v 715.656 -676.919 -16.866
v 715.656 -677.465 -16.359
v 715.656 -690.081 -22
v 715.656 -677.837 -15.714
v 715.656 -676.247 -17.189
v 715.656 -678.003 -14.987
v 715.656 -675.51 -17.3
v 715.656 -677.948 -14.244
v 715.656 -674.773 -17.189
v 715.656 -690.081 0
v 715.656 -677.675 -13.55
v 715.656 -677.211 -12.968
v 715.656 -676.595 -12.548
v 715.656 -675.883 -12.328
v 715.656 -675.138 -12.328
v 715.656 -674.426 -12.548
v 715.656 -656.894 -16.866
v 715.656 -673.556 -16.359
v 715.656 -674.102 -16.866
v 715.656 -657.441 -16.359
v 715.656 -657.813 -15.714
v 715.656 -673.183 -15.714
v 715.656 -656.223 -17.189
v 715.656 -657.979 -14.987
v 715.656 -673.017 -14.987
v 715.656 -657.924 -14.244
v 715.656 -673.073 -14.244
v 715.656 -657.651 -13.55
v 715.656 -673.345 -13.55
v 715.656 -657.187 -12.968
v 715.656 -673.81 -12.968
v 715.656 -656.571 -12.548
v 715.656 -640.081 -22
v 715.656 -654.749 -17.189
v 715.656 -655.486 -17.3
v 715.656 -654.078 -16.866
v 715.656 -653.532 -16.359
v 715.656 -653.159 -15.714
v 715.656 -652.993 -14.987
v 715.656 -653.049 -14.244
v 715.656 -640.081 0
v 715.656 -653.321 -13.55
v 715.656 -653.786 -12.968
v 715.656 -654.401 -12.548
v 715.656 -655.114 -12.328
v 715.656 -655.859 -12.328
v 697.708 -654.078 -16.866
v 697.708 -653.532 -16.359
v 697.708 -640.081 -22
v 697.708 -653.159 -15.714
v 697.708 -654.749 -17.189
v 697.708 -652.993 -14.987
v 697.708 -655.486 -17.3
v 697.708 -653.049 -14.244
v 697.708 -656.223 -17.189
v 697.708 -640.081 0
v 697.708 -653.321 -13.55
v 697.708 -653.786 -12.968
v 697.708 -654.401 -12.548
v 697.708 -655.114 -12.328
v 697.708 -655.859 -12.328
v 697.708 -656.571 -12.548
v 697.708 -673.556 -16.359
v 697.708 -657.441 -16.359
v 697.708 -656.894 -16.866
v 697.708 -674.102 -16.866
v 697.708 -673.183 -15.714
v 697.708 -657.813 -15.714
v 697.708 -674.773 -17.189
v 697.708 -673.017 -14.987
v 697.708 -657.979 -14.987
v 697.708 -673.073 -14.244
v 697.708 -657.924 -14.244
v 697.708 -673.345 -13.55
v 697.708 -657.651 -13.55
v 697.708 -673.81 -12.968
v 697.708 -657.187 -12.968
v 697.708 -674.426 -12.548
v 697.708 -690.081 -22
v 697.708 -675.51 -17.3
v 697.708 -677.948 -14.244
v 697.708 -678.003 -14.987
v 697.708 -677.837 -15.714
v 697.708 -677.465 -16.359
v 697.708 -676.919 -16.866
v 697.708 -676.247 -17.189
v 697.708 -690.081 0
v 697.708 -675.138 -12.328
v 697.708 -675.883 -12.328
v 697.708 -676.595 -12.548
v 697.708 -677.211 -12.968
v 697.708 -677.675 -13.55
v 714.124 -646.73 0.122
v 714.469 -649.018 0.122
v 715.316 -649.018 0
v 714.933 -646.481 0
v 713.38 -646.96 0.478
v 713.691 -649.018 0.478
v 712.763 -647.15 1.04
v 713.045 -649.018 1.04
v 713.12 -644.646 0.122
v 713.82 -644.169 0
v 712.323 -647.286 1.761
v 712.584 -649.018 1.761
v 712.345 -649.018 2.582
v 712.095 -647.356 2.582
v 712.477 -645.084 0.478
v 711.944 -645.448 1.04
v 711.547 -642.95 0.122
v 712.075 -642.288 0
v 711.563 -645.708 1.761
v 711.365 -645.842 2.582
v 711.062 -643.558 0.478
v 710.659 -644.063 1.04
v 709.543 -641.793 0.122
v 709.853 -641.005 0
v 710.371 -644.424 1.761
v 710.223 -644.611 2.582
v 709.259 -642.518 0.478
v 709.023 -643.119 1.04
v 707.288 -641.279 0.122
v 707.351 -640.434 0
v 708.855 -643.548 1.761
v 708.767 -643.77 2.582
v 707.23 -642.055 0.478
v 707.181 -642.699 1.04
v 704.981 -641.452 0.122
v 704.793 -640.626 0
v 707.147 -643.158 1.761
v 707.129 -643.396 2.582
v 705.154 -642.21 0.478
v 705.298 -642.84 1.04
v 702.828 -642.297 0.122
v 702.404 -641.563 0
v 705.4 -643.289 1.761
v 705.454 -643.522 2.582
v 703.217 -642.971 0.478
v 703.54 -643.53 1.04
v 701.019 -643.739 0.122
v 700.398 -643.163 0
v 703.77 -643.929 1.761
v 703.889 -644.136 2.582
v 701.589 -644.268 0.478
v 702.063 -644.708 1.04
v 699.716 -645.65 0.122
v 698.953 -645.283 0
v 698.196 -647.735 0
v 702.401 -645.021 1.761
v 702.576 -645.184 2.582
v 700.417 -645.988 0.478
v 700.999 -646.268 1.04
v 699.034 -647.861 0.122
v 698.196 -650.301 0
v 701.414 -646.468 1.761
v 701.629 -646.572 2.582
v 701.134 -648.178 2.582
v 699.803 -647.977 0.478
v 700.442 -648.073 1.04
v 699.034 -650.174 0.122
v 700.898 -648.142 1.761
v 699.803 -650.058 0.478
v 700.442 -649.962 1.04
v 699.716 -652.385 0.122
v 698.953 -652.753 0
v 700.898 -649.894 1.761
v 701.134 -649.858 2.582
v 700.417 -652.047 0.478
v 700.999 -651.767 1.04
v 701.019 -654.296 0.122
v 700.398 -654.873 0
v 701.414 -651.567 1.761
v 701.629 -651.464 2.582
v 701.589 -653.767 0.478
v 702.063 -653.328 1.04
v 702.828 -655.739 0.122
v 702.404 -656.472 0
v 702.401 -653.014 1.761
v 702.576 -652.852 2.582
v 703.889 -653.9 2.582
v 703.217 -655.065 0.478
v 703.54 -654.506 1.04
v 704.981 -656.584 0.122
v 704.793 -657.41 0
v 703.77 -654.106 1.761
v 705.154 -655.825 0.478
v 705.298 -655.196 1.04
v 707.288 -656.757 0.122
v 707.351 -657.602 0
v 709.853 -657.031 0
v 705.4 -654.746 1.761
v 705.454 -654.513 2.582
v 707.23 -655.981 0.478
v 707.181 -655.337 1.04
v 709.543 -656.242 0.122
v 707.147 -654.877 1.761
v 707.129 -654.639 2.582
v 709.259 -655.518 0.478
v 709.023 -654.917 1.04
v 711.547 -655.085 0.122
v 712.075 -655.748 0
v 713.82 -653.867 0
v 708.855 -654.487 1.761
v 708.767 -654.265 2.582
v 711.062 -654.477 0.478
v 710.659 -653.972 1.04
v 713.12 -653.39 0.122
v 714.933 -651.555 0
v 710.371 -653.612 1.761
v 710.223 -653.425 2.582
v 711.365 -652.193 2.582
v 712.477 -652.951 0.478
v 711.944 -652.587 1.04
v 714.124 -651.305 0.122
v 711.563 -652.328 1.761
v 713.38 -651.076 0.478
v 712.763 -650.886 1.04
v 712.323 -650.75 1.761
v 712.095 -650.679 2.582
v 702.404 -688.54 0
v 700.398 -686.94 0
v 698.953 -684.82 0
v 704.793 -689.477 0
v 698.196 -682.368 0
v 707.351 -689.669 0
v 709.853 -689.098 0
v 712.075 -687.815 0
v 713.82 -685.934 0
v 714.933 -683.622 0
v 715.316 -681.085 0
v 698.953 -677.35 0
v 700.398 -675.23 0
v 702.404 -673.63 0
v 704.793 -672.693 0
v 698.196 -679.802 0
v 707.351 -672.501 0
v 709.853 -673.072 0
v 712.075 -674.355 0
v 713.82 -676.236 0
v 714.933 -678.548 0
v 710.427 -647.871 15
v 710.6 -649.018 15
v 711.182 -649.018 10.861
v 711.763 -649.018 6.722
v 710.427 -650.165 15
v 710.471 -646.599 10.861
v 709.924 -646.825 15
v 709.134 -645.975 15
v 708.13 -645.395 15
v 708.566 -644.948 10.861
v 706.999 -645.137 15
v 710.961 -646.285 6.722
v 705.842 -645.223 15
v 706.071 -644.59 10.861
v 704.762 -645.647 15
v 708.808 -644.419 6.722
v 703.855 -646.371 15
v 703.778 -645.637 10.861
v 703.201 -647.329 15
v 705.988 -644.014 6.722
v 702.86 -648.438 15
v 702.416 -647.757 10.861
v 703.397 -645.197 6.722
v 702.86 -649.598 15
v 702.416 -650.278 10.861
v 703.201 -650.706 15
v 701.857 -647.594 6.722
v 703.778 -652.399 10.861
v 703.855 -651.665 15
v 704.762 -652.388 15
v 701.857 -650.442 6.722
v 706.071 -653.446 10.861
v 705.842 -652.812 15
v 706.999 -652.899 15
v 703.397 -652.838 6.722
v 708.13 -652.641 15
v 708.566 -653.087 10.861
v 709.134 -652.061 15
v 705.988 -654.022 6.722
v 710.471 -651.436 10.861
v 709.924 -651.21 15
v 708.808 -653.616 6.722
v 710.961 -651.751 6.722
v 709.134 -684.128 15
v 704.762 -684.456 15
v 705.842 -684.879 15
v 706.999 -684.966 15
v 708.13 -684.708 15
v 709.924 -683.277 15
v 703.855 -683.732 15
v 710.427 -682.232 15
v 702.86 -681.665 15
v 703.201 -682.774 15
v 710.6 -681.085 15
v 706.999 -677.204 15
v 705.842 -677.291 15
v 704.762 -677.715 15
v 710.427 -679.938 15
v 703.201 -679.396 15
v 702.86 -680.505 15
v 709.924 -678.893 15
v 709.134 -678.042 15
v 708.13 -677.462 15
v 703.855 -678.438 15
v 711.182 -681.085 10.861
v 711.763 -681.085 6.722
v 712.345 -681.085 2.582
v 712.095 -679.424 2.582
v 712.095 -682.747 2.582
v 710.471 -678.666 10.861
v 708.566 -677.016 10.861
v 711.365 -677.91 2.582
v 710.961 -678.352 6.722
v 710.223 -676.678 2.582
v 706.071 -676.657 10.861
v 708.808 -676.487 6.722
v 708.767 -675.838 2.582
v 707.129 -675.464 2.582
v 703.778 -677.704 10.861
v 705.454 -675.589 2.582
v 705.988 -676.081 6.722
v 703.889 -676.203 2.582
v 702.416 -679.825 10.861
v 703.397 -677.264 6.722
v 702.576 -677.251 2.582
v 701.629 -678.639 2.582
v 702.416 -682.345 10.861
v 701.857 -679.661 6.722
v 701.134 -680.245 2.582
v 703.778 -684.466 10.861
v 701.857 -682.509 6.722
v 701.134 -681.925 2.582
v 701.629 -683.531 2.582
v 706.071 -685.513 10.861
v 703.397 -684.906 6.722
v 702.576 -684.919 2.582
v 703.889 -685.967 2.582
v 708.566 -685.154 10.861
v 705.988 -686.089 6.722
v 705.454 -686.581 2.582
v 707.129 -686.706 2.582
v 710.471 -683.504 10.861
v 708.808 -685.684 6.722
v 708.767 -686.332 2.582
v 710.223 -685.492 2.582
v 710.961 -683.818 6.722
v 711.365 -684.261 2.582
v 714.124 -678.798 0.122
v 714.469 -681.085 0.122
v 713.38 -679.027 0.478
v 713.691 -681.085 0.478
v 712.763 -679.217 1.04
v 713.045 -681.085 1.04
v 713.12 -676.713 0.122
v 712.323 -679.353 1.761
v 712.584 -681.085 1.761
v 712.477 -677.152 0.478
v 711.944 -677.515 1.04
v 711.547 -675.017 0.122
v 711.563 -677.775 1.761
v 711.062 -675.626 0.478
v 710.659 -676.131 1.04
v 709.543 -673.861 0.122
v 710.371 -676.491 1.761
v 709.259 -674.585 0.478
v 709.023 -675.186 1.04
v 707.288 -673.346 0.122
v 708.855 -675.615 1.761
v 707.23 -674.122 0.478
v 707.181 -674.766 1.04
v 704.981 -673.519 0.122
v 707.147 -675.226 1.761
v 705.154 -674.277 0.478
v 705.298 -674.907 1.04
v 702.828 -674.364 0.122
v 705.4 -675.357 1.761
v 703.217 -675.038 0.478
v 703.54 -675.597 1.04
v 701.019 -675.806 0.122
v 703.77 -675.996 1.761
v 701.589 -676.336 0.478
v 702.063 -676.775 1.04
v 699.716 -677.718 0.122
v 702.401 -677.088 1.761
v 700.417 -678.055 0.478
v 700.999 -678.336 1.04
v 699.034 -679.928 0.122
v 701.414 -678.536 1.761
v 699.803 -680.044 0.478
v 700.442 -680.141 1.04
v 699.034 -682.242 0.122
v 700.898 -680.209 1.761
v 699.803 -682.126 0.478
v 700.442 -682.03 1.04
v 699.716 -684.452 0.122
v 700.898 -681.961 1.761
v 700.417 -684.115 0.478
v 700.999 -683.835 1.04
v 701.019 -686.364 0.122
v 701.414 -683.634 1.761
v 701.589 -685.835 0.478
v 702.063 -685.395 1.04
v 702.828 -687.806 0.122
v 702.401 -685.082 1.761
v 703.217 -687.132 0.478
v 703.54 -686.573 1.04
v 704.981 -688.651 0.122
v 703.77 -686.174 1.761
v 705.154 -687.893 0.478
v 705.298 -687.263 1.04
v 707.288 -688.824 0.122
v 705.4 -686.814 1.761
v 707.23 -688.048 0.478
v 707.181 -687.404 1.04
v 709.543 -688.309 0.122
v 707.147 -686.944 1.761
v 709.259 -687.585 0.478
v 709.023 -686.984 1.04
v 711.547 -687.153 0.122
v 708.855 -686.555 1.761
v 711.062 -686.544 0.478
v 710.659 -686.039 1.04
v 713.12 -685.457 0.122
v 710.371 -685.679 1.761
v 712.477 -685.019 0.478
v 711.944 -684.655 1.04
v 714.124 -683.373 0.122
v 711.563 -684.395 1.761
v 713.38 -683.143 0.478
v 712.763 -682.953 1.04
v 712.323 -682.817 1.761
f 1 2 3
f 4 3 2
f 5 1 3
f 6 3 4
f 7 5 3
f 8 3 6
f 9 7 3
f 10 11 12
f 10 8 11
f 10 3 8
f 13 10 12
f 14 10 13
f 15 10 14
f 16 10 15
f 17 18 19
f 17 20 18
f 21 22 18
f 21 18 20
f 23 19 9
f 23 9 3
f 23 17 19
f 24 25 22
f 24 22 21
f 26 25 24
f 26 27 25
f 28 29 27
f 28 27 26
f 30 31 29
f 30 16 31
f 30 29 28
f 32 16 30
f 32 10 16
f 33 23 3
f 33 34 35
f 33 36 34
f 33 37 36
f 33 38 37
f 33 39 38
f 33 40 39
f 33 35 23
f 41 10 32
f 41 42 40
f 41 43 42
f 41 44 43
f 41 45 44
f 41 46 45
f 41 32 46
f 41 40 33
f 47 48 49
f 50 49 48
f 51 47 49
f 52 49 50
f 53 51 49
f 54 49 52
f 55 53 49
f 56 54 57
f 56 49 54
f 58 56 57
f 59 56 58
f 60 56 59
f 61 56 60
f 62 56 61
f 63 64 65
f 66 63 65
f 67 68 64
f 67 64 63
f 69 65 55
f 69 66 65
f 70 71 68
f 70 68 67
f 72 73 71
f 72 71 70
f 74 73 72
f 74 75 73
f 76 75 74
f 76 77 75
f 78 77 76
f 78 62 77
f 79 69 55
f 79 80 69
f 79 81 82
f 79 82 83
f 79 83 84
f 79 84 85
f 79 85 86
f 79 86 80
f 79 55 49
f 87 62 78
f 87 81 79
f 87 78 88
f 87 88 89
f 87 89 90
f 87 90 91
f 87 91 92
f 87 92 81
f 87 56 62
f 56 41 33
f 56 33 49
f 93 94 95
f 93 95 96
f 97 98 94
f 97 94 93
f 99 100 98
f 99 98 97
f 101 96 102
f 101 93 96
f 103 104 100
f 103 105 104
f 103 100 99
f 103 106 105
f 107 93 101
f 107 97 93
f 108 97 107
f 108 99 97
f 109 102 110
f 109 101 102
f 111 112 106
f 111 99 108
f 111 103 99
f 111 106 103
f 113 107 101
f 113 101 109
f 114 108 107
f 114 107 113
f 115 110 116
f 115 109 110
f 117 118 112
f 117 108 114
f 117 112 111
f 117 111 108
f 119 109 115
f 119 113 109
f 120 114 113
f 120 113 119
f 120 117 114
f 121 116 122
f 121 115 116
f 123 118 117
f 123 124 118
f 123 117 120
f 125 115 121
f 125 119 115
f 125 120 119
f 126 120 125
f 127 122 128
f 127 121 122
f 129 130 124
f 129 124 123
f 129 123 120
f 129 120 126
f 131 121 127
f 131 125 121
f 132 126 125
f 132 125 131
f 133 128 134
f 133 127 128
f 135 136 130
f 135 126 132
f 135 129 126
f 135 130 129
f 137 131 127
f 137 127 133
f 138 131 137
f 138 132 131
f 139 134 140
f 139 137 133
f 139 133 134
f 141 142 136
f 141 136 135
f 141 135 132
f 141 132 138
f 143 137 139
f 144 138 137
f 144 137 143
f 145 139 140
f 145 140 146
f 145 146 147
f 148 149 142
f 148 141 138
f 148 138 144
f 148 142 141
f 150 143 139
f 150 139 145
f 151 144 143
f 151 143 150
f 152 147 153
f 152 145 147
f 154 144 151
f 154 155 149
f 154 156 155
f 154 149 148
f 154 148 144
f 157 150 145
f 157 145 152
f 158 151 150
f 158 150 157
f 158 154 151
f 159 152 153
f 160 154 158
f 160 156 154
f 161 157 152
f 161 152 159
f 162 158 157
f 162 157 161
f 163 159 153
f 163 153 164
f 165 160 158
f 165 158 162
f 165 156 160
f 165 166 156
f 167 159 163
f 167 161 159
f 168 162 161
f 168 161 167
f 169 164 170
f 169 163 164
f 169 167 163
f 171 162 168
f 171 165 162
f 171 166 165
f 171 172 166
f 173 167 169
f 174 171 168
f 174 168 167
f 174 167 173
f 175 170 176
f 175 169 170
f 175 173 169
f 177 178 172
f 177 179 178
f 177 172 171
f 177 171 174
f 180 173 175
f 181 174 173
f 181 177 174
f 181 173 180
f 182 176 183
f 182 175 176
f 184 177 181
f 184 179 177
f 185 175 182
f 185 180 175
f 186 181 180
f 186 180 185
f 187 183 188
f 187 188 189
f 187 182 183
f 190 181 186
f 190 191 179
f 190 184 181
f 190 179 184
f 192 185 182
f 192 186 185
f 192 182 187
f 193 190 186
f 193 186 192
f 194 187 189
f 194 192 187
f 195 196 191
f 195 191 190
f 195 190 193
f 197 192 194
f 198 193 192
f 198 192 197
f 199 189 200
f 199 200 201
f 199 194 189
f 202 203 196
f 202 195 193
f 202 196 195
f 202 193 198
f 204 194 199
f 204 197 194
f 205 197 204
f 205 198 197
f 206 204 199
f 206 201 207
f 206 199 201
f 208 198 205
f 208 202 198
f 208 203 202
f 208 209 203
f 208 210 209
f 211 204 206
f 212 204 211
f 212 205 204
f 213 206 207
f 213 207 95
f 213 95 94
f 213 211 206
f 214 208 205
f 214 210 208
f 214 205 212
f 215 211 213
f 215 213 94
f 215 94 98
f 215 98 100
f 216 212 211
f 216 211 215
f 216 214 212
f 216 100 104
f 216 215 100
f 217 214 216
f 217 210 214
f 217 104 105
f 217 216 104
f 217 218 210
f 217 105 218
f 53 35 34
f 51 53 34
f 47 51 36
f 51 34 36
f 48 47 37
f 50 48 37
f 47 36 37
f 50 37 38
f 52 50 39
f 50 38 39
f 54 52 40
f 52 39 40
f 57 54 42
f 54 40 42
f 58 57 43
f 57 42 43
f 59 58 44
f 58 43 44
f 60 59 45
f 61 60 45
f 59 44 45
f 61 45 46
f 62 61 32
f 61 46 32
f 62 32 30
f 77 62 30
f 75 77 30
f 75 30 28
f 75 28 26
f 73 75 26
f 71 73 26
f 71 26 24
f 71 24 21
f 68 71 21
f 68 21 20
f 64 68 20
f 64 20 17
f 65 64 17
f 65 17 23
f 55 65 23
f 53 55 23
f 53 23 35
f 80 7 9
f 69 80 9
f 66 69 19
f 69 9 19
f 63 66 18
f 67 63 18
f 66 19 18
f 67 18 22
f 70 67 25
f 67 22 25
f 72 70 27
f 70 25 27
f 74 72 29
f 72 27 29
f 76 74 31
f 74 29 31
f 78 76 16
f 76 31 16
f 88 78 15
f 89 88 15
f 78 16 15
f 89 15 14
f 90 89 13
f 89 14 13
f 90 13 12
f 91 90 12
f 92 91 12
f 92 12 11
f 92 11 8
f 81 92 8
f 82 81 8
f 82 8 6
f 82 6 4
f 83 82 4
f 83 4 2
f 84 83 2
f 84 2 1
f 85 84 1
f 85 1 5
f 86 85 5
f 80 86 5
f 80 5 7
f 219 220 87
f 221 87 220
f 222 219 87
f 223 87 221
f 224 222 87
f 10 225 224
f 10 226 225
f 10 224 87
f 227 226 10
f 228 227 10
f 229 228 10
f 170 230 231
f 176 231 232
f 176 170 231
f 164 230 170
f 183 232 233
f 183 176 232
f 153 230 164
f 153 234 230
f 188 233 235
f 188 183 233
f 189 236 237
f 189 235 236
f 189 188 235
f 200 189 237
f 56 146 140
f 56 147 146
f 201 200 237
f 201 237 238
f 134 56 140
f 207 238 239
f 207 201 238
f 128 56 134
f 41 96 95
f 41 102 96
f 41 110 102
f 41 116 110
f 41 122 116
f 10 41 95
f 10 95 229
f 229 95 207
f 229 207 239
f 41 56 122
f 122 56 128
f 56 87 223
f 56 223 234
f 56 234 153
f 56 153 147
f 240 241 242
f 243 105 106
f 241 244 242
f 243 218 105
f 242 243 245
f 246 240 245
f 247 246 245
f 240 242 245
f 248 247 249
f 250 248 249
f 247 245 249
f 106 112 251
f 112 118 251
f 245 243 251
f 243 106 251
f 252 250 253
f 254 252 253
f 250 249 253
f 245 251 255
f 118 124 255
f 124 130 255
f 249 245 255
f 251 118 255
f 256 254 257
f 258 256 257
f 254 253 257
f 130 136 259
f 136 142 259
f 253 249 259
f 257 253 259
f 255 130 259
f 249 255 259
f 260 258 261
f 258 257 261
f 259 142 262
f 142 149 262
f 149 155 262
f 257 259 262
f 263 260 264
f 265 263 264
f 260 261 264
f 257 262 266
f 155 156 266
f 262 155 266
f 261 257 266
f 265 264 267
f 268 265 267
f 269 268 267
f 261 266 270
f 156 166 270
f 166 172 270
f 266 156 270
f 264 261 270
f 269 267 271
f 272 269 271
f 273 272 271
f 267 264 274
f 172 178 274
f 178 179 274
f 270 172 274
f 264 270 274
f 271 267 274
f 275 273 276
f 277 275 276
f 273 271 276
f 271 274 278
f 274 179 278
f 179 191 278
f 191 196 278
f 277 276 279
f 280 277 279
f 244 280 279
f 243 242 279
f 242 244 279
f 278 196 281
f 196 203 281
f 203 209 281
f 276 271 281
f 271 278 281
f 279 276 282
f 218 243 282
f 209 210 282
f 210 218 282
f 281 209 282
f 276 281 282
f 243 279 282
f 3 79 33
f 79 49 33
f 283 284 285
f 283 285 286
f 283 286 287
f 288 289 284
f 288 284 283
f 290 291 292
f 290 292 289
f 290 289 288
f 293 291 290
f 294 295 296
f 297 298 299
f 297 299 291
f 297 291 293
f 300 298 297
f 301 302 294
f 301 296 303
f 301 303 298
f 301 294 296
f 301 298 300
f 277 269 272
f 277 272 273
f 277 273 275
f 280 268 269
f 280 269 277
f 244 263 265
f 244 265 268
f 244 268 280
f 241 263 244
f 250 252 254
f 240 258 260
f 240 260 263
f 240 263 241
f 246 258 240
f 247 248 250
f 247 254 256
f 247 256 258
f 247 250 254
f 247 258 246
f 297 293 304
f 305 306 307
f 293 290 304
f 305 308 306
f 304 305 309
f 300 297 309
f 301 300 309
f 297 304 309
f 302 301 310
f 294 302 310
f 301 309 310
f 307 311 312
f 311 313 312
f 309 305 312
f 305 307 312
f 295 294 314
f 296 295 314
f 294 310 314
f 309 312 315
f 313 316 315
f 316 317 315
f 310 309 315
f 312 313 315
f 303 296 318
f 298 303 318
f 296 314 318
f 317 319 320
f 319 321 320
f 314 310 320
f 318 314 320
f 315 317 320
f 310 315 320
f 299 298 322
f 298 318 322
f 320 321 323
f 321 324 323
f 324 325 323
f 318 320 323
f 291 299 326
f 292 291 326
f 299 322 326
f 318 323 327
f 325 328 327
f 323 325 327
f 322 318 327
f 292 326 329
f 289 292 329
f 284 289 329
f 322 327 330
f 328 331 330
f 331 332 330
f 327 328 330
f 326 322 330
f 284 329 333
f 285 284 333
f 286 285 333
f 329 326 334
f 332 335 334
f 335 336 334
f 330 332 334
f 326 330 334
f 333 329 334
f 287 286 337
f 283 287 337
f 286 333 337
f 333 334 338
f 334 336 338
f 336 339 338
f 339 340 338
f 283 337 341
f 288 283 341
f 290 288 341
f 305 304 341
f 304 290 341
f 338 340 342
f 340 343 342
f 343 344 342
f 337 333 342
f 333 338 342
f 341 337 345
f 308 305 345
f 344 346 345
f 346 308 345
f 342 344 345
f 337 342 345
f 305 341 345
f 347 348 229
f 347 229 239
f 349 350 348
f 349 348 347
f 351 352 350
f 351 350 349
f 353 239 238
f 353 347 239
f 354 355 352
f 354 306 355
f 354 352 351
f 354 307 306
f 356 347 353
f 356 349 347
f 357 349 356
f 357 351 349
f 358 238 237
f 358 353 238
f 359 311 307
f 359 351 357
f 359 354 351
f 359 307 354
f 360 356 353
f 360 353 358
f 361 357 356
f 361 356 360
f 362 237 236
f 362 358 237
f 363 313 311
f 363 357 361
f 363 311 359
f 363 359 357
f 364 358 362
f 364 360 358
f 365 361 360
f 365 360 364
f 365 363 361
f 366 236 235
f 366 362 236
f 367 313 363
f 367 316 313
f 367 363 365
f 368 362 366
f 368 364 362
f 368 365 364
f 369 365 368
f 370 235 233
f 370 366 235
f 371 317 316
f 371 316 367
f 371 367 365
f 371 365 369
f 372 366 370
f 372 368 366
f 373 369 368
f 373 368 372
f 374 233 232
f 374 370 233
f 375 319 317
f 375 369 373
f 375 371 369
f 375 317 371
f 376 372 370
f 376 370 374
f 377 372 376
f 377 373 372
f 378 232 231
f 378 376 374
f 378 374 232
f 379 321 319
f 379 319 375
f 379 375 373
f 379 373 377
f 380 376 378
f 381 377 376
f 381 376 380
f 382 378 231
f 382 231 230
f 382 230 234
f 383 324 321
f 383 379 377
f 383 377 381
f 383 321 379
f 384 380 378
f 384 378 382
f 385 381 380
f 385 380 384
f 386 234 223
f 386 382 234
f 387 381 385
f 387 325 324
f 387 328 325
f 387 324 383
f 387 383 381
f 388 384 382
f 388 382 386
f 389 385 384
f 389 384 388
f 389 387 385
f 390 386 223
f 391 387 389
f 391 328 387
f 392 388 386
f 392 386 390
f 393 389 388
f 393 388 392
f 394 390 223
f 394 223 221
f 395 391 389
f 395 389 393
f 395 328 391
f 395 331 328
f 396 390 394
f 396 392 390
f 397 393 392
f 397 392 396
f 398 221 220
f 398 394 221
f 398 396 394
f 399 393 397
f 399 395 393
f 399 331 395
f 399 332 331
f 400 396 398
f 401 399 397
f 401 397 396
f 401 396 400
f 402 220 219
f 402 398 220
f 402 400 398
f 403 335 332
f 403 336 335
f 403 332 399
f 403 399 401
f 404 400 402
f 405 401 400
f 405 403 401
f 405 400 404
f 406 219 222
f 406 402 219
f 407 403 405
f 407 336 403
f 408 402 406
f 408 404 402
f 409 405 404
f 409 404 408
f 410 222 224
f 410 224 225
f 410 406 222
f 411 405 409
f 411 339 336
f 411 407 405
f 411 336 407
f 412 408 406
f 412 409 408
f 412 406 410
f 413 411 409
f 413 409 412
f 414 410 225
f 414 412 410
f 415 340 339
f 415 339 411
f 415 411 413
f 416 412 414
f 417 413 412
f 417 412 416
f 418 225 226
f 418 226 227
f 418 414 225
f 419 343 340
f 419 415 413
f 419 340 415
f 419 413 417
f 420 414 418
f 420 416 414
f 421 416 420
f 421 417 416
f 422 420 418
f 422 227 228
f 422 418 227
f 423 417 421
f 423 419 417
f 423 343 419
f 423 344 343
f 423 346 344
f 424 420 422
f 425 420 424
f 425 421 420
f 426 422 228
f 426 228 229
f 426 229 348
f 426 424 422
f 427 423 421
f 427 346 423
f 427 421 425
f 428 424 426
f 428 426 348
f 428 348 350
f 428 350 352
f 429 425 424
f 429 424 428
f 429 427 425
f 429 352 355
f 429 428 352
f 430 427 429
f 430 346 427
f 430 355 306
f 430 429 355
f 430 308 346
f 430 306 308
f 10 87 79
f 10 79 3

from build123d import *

# Parameters (mm, degrees)
BOSS_EXTRUDE1_DEPTH           = 22
SKETCH3_R                     = 6
BOSS_EXTRUDE3_DEPTH           = 15
BOSS_EXTRUDE3_DRAFT           = 8
BOSS_EXTRUDE3_PROFILE_2_DEPTH = 15
BOSS_EXTRUDE3_PROFILE_2_DRAFT = 8
FILLET2_R                     = 3
SKETCH4_R                     = 2.500012638
CUT_EXTRUDE1_DEPTH            = 50
SKETCH5_R                     = 2.500012638
CUT_EXTRUDE2_DEPTH            = 50


with BuildPart() as part:
    # Sketch2 → Boss-Extrude1 (new body)
    with BuildSketch(Plane.XY):
        Polygon((697.707943159, -649.017765949), (697.707943159, -690.080887605), (715.655949844, -690.080887605), (715.655949844, -640.080811229), (697.707943159, -640.080811229), align=None)
    extrude(amount=-BOSS_EXTRUDE1_DEPTH)


with BuildPart() as boss_extrude3_tool:
    # Sketch3 → Boss-Extrude3 (with draft: the straight prism first)
    with BuildSketch(Plane.XY):
        with Locations((706.707943159, -649.017765949)):
            Circle(SKETCH3_R)
    extrude(amount=BOSS_EXTRUDE3_DEPTH)
    # Boss-Extrude3: the draft: its side faces are tilted about the plane it starts from
    boss_extrude3_sides = [boss_extrude3_tool.faces().sort_by_distance(p)[0] for p in [
        (700.707943159, -649.017765949, 7.5),
    ]]
    draft(boss_extrude3_sides, Plane.XY, BOSS_EXTRUDE3_DRAFT)


with BuildPart() as part_1:
    add(part.part)

    # Boss-Extrude3: add boss_extrude3_tool
    add(boss_extrude3_tool.part)


with BuildPart() as boss_extrude3_profile_2_tool:
    # Sketch3 → Boss-Extrude3 profile 2 (with draft: the straight prism first)
    with BuildSketch(Plane.XY):
        with Locations((706.707943159, -681.085054274)):
            Circle(SKETCH3_R)
    extrude(amount=BOSS_EXTRUDE3_PROFILE_2_DEPTH)
    # Boss-Extrude3 profile 2: the draft: its side faces are tilted about the plane it starts from
    boss_extrude3_profile_2_sides = [boss_extrude3_profile_2_tool.faces().sort_by_distance(p)[0] for p in [
        (700.707943159, -681.085054274, 7.5),
    ]]
    draft(boss_extrude3_profile_2_sides, Plane.XY, BOSS_EXTRUDE3_PROFILE_2_DRAFT)


with BuildPart() as part_2:
    add(part_1.part)

    # Boss-Extrude3 profile 2: add boss_extrude3_profile_2_tool
    add(boss_extrude3_profile_2_tool.part)

    # Fillet2
    fillet2_edges = [part_2.edges().sort_by_distance(p)[0] for p in [
        (700.707943159, -649.017765949, 0),
        (700.707943159, -681.085054274, 0),
    ]]
    fillet(fillet2_edges, radius=FILLET2_R)

    # Sketch4 → Cut-Extrude1 (cut)
    with BuildSketch(Plane(origin=(715.655949844, 0, 0), x_dir=(0, 0, -1), z_dir=(1, 0, 0))):
        with Locations((14.80020958, -655.486173041)):
            Circle(SKETCH4_R)
    extrude(amount=-CUT_EXTRUDE1_DEPTH, mode=Mode.SUBTRACT)

    # Sketch5 → Cut-Extrude2 (cut)
    with BuildSketch(Plane(origin=(715.655949844, 0, 0), x_dir=(0, 0, -1), z_dir=(1, 0, 0))):
        with Locations((14.80020958, -675.510263036)):
            Circle(SKETCH5_R)
    extrude(amount=-CUT_EXTRUDE2_DEPTH, mode=Mode.SUBTRACT)


solid = part_2.part
